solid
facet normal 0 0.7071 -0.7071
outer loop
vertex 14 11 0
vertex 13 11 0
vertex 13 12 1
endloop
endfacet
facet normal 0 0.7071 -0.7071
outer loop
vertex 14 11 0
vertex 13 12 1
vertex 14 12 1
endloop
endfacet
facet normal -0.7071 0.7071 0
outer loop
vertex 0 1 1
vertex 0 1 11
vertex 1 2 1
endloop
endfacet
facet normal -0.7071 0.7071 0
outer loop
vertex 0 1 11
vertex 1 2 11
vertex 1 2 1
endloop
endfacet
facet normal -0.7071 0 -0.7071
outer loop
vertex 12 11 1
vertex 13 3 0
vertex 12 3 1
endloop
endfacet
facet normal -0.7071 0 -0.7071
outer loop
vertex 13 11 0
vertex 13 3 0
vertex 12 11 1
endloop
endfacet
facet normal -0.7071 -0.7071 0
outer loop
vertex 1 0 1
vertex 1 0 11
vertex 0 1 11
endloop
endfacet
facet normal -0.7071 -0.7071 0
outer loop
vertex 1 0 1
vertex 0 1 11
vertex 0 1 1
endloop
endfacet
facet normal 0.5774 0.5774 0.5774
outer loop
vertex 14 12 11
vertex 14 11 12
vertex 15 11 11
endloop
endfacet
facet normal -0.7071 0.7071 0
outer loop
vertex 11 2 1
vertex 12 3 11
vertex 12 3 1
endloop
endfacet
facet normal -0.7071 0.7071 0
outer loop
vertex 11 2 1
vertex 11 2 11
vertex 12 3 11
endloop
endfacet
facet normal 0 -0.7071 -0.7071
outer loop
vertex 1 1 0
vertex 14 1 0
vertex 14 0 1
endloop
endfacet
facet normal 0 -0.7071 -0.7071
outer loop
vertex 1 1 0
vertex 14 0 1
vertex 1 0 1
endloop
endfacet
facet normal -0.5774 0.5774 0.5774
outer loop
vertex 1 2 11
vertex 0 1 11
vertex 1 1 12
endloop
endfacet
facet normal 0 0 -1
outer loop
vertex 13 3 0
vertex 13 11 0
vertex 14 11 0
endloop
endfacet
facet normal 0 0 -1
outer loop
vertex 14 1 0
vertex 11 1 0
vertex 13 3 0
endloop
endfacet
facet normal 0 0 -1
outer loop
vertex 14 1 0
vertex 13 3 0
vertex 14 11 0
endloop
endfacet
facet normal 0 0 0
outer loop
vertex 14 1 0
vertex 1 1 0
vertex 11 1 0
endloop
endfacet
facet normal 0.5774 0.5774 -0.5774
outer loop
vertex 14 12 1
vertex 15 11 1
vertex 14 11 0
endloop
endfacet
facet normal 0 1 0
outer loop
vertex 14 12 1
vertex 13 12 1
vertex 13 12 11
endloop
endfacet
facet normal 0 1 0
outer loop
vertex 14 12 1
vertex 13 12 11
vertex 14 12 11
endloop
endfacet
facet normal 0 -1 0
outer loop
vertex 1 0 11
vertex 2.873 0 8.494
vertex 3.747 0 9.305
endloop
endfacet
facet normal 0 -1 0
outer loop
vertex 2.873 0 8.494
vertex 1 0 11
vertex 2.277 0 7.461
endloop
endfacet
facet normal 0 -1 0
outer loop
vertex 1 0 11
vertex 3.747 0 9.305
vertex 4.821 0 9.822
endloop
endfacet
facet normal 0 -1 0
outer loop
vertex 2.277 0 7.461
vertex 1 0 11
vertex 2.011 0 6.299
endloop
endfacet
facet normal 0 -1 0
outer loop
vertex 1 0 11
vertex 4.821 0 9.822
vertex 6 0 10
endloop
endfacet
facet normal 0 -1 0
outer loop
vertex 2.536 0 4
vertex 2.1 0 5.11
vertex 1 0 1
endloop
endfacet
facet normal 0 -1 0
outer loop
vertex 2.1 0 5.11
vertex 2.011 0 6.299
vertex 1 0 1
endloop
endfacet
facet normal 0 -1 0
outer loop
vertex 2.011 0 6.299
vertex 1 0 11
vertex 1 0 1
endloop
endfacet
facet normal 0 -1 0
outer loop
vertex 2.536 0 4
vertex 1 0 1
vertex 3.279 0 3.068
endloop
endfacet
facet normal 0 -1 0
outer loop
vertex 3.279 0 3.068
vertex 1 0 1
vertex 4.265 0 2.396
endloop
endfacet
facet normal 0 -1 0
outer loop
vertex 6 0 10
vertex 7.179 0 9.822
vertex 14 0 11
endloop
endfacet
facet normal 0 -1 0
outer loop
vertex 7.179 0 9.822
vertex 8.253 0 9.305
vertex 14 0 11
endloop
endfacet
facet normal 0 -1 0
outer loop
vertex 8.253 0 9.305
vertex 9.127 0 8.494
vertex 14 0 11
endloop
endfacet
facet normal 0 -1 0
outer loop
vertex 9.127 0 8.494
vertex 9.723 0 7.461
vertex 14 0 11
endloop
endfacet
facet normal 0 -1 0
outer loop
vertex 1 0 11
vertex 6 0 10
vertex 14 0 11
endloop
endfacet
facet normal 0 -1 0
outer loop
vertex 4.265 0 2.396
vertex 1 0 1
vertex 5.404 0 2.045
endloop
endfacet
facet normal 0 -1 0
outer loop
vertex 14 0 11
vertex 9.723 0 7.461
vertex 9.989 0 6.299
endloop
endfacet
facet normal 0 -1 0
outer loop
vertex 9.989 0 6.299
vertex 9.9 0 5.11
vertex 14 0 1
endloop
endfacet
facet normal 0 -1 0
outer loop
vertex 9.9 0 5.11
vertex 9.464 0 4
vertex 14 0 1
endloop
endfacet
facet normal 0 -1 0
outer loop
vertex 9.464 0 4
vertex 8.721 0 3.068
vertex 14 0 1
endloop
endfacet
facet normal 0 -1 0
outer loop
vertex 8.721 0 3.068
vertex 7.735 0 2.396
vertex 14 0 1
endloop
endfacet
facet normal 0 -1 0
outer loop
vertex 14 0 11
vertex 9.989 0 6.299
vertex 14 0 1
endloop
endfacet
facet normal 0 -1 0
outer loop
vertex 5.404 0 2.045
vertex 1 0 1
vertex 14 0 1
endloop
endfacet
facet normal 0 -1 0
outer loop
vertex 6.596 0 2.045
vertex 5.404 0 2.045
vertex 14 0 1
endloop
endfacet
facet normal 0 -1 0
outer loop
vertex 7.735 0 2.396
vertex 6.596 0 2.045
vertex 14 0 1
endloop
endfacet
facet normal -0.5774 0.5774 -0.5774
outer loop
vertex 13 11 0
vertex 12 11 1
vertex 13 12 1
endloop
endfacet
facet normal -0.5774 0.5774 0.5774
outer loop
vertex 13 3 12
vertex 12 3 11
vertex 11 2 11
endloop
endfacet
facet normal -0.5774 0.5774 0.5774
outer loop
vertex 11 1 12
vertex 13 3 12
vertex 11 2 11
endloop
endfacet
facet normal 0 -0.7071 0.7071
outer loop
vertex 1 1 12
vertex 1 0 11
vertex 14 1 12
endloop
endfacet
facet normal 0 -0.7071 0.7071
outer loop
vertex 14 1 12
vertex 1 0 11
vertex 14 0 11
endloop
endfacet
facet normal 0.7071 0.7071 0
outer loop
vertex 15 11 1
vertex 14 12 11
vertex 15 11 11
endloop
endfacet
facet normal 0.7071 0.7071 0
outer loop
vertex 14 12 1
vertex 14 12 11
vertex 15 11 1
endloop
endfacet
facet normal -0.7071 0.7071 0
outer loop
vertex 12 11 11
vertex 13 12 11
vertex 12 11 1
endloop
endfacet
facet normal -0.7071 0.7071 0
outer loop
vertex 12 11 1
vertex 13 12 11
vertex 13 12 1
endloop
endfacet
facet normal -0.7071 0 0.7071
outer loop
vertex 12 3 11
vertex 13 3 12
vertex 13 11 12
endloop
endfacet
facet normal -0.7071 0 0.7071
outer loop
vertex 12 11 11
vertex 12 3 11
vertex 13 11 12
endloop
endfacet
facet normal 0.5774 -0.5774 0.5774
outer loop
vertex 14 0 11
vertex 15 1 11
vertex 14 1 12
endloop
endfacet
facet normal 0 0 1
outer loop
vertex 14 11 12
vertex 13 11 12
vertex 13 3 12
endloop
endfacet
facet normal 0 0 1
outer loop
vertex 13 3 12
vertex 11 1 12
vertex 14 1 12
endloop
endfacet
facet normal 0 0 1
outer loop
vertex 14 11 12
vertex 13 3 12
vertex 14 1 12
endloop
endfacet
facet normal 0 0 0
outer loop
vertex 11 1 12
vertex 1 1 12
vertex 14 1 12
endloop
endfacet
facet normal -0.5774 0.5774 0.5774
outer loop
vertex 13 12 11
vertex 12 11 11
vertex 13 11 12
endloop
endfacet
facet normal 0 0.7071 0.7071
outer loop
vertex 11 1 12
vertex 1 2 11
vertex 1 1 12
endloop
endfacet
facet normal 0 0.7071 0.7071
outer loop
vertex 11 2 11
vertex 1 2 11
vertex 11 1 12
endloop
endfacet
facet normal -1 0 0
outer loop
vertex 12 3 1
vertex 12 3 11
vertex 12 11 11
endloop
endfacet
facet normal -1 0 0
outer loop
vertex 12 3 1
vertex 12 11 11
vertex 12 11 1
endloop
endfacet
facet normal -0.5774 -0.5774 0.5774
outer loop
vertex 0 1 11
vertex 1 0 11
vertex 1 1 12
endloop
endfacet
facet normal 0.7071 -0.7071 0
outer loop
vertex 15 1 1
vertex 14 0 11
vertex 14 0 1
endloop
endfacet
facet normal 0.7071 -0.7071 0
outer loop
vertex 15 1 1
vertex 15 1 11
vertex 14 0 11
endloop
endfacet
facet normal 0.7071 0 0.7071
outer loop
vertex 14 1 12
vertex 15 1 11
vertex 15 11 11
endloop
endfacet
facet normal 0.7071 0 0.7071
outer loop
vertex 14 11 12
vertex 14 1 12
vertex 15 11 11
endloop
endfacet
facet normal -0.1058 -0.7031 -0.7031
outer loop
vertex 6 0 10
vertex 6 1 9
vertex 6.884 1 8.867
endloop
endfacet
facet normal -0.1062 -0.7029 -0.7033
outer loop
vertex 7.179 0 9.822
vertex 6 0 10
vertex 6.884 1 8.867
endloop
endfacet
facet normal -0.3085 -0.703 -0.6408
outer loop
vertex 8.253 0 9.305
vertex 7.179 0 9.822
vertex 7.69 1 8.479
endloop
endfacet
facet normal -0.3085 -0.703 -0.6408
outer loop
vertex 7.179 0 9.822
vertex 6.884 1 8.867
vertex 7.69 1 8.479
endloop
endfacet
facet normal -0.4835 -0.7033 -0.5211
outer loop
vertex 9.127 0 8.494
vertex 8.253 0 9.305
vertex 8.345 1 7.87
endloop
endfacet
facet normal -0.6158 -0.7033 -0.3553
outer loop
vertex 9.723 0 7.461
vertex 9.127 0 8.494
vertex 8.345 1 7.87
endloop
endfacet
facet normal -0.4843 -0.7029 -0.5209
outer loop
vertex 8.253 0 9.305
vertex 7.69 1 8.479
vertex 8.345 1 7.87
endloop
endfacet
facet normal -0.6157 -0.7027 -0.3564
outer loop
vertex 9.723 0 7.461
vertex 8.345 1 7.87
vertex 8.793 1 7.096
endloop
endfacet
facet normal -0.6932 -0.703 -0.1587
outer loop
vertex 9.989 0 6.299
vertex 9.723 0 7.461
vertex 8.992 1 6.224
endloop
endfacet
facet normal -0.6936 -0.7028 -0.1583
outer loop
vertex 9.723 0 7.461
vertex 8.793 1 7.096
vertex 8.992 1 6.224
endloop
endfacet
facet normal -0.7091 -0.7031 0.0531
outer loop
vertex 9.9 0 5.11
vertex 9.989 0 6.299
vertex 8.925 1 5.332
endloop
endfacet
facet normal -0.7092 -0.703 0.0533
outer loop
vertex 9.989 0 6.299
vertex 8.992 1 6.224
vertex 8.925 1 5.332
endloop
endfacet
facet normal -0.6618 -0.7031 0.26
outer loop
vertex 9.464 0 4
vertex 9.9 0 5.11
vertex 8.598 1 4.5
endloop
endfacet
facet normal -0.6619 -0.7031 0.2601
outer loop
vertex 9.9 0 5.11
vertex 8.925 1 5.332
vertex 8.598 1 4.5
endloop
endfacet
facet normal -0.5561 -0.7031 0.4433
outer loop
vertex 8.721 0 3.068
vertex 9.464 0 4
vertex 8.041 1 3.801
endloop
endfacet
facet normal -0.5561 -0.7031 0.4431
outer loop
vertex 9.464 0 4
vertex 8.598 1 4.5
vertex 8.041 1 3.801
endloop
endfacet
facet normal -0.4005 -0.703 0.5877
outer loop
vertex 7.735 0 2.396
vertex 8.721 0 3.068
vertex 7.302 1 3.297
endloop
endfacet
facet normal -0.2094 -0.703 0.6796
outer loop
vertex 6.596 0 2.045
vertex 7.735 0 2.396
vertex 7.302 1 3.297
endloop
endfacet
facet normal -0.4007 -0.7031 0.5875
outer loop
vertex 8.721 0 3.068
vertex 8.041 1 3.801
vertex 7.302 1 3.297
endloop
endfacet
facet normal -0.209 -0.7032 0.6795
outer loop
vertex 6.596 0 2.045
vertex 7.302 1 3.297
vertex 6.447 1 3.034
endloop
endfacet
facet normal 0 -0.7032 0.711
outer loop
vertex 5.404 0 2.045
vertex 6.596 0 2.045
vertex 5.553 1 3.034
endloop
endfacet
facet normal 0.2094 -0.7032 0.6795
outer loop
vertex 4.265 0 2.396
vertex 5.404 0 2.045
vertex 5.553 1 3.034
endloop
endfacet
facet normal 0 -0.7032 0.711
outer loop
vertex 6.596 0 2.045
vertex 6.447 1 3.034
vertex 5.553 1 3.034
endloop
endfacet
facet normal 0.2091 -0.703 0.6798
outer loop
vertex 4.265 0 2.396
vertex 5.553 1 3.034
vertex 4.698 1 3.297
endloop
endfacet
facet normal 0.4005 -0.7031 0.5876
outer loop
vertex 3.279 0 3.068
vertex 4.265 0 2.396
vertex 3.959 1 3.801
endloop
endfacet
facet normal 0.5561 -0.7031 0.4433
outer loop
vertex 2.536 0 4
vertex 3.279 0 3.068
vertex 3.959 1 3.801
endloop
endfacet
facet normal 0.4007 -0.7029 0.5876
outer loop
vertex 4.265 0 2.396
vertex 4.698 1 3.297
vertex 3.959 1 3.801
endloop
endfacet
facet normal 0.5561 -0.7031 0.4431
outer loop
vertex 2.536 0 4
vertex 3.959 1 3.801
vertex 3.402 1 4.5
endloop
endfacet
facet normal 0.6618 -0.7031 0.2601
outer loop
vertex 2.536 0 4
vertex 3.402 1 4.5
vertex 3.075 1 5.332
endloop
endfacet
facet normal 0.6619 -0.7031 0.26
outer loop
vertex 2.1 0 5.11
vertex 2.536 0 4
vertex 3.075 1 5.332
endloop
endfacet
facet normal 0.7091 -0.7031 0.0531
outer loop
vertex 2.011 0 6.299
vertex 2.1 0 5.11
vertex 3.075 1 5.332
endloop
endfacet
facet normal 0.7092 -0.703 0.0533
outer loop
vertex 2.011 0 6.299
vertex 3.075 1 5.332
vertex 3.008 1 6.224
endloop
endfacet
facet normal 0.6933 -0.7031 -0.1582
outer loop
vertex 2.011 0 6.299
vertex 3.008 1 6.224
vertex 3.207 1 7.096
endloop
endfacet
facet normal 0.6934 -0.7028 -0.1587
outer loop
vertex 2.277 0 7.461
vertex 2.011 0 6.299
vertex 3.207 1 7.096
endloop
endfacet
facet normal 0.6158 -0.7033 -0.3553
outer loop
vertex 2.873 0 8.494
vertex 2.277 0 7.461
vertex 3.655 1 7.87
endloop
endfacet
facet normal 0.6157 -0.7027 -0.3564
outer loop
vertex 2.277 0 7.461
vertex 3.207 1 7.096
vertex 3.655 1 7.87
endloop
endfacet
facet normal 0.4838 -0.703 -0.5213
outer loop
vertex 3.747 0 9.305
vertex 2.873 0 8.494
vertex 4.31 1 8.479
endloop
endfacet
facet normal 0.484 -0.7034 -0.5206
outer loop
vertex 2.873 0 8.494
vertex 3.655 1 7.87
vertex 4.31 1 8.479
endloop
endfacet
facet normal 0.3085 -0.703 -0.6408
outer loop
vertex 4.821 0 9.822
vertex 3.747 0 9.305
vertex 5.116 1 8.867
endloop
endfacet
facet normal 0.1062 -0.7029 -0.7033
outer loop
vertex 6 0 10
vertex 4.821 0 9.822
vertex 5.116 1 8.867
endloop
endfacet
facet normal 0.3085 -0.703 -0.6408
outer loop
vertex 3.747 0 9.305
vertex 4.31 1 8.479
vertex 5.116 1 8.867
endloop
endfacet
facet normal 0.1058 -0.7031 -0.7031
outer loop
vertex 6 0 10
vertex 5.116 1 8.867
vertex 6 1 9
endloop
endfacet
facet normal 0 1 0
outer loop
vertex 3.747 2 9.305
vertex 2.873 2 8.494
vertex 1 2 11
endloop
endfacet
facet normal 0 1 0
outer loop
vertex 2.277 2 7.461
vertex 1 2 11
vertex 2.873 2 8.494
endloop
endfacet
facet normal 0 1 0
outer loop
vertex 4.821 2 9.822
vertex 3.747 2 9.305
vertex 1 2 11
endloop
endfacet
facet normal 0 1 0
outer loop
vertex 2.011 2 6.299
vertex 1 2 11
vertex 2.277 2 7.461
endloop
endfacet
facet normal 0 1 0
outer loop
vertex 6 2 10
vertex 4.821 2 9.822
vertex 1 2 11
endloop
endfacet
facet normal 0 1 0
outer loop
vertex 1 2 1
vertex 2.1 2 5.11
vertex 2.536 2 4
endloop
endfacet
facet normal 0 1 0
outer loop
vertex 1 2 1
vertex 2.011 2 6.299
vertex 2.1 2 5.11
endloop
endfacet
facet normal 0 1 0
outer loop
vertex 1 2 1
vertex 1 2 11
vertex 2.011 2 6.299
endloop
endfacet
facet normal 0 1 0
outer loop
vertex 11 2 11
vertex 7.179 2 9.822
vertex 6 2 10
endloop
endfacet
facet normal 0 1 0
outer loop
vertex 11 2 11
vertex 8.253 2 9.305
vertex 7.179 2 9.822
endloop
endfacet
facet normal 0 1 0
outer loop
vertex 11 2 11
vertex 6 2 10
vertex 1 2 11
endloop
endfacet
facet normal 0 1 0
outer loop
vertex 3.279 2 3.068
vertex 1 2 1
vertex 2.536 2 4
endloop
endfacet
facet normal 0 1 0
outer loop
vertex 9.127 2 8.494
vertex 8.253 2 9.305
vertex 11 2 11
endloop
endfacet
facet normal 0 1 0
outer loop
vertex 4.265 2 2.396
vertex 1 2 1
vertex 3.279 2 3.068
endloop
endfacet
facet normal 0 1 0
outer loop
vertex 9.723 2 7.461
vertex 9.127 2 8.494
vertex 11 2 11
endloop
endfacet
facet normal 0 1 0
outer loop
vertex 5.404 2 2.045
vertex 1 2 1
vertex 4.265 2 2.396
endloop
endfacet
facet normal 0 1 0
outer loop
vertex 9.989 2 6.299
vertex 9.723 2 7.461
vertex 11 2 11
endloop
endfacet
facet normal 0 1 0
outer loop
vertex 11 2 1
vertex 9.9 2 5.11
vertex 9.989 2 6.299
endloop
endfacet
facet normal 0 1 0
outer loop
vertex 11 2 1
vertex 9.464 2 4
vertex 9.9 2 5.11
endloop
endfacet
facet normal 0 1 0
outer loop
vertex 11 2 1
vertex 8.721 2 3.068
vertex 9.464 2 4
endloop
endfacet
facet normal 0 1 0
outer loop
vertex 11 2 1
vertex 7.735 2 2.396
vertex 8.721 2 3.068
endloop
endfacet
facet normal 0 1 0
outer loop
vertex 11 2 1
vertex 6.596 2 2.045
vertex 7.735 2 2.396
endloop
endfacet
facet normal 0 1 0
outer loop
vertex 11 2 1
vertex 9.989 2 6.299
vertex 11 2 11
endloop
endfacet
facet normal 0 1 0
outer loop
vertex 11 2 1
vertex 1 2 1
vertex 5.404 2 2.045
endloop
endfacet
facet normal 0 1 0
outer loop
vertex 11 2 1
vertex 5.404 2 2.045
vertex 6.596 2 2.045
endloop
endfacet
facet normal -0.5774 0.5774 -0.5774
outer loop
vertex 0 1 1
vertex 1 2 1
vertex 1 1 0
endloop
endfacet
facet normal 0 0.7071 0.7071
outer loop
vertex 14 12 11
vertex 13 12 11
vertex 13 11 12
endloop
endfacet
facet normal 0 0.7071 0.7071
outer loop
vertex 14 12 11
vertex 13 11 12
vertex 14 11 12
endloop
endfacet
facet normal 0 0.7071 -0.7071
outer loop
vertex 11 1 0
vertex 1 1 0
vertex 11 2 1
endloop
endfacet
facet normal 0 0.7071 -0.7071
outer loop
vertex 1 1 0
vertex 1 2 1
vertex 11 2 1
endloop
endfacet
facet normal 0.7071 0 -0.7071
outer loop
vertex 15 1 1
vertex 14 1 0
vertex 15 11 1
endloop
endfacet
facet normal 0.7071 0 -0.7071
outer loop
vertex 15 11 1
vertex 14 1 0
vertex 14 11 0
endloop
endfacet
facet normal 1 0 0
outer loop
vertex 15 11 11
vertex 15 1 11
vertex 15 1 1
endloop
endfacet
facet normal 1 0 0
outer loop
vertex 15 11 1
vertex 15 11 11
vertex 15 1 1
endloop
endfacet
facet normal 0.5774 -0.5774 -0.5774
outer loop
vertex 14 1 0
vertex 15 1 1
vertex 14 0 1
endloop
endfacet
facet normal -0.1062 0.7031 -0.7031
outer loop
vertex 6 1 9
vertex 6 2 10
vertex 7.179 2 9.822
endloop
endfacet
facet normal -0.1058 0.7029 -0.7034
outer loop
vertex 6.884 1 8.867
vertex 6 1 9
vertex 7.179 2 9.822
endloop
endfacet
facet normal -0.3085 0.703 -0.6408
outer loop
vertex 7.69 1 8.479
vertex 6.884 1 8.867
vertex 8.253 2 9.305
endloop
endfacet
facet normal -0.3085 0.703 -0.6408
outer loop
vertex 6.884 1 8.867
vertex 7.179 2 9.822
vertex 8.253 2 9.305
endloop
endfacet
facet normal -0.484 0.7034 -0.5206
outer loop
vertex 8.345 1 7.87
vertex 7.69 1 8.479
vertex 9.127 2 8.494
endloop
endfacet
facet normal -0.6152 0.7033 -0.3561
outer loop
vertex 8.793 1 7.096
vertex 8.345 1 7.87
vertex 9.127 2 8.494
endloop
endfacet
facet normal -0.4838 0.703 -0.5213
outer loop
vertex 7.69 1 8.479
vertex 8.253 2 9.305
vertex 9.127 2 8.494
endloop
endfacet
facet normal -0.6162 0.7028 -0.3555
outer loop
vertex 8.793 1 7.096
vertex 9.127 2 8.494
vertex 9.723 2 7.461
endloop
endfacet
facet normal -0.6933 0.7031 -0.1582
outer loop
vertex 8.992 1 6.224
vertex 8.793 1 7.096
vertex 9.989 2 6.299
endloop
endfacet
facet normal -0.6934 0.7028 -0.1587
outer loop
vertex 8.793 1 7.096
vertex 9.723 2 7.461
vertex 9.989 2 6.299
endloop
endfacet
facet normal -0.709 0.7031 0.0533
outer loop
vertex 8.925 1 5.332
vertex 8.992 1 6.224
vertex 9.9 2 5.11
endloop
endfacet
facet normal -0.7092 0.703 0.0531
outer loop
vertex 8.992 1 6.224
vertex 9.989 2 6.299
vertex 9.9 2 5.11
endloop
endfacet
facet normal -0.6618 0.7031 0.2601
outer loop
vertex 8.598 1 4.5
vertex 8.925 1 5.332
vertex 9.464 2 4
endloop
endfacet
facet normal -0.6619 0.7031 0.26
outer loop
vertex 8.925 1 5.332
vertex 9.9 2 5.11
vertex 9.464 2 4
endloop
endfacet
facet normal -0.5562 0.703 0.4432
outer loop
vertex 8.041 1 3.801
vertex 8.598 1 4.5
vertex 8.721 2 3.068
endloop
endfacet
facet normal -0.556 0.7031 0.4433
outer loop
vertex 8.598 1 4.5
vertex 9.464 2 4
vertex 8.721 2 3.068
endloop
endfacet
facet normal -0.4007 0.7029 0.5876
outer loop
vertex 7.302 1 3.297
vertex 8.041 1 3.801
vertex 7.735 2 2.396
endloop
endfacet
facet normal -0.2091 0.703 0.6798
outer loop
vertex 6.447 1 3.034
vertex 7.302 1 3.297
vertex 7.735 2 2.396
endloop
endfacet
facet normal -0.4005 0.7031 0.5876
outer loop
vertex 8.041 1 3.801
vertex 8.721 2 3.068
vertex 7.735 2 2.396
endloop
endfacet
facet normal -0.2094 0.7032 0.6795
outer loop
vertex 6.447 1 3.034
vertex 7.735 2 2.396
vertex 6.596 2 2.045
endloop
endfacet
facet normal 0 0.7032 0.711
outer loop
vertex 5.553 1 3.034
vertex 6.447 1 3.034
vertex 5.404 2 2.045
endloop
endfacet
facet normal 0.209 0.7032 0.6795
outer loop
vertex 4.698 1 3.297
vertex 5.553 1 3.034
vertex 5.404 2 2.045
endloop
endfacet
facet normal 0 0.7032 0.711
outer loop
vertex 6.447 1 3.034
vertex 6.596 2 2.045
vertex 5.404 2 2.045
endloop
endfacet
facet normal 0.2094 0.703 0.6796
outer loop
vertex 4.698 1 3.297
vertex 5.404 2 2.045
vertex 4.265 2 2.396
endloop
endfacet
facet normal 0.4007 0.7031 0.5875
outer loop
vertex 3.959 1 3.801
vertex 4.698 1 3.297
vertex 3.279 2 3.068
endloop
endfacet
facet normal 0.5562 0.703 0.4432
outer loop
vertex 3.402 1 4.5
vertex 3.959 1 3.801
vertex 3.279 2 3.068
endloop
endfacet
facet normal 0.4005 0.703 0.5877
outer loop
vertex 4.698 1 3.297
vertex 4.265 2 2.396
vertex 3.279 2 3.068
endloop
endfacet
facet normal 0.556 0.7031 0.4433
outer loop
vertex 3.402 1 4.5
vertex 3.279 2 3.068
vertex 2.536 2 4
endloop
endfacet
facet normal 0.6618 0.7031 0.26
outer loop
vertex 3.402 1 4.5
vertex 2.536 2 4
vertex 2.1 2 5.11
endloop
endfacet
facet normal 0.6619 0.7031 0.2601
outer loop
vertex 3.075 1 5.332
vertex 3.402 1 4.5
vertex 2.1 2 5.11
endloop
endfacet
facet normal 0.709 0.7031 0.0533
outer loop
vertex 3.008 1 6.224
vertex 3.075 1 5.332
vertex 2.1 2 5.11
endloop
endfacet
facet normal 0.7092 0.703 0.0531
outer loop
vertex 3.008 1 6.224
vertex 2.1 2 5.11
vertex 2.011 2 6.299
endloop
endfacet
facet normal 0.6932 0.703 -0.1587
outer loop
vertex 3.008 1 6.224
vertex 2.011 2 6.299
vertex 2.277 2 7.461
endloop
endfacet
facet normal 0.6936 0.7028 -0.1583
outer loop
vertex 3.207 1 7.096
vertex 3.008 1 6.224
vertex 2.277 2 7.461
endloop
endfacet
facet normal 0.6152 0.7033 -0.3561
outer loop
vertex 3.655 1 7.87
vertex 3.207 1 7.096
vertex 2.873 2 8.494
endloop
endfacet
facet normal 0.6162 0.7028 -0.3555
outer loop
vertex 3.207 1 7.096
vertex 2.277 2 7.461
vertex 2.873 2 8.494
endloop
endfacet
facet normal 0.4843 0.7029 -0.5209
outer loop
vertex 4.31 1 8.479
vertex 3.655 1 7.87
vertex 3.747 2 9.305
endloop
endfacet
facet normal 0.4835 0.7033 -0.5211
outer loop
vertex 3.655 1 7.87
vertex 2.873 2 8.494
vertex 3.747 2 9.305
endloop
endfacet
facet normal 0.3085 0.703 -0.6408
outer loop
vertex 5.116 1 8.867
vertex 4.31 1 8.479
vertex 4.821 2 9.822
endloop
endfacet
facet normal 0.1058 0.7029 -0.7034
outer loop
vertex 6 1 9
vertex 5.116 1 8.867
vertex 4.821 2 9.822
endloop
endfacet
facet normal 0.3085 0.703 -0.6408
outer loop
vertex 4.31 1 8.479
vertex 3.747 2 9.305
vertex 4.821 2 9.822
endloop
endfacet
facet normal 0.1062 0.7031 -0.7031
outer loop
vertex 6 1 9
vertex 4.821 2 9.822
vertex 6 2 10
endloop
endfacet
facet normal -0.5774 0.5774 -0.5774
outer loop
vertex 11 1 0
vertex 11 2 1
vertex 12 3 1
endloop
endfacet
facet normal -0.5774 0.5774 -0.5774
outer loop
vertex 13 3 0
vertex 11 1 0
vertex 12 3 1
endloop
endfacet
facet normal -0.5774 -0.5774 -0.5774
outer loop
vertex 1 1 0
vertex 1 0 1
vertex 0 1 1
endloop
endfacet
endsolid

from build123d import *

# Parameters (mm, degrees)
SKETCH_1_W           = 12
SKETCH_1_H           = 12
SKETCH_1_R           = 3
EXTRUDE_1_DEPTH      = 2
EXTRUDE_2_DEPTH      = 10
EXTRUDE_2_DEPTH_BACK = 2
SKETCH_2_W           = 3
SKETCH_2_H           = 12
CHAMFER_1_SIZE       = 1


with BuildPart() as part:
    # 草图1 → 凸台-拉伸1 (new body)
    with BuildSketch(Plane(origin=(0, 0, 0), x_dir=(1, 0, 0), z_dir=(0, 1, 0))):
        with Locations((6, -6)):
            Rectangle(SKETCH_1_W, SKETCH_1_H)
        with Locations(Location((6, -6, 0), (0, 0, 270))):
            Circle(SKETCH_1_R, mode=Mode.SUBTRACT)
    extrude(amount=EXTRUDE_1_DEPTH)

    # 草图2 → 凸台-拉伸2 (add, two sides: drawn at the far end of the back side and taken through both)
    with BuildSketch(Plane(origin=(0, 2, 0), x_dir=(1, 0, 0), z_dir=(0, 1, 0)).offset(-EXTRUDE_2_DEPTH_BACK)):
        with Locations((13.5, -6)):
            Rectangle(SKETCH_2_W, SKETCH_2_H)
    extrude(amount=EXTRUDE_2_DEPTH + EXTRUDE_2_DEPTH_BACK)

    # 倒角1
    chamfer_1_edges = [part.edges().sort_by_distance(p)[0] for p in [
        (6, 0, 3),
        (6, 2, 3),
        (12, 2, 6),
        (6, 2, 0),
        (12, 7, 12),
        (12, 7, 0),
        (15, 6, 0),
        (15, 0, 6),
        (15, 6, 12),
        (12, 12, 6),
        (13.5, 12, 12),
        (15, 12, 6),
        (13.5, 12, 0),
        (0, 2, 6),
        (7.5, 0, 0),
        (7.5, 0, 12),
        (0, 0, 6),
        (0, 1, 0),
        (0, 1, 12),
        (6, 2, 12),
    ]]
    chamfer(chamfer_1_edges, length=CHAMFER_1_SIZE - 0.0001)  # a hair under: the kernel refuses the full size


solid = part.part
